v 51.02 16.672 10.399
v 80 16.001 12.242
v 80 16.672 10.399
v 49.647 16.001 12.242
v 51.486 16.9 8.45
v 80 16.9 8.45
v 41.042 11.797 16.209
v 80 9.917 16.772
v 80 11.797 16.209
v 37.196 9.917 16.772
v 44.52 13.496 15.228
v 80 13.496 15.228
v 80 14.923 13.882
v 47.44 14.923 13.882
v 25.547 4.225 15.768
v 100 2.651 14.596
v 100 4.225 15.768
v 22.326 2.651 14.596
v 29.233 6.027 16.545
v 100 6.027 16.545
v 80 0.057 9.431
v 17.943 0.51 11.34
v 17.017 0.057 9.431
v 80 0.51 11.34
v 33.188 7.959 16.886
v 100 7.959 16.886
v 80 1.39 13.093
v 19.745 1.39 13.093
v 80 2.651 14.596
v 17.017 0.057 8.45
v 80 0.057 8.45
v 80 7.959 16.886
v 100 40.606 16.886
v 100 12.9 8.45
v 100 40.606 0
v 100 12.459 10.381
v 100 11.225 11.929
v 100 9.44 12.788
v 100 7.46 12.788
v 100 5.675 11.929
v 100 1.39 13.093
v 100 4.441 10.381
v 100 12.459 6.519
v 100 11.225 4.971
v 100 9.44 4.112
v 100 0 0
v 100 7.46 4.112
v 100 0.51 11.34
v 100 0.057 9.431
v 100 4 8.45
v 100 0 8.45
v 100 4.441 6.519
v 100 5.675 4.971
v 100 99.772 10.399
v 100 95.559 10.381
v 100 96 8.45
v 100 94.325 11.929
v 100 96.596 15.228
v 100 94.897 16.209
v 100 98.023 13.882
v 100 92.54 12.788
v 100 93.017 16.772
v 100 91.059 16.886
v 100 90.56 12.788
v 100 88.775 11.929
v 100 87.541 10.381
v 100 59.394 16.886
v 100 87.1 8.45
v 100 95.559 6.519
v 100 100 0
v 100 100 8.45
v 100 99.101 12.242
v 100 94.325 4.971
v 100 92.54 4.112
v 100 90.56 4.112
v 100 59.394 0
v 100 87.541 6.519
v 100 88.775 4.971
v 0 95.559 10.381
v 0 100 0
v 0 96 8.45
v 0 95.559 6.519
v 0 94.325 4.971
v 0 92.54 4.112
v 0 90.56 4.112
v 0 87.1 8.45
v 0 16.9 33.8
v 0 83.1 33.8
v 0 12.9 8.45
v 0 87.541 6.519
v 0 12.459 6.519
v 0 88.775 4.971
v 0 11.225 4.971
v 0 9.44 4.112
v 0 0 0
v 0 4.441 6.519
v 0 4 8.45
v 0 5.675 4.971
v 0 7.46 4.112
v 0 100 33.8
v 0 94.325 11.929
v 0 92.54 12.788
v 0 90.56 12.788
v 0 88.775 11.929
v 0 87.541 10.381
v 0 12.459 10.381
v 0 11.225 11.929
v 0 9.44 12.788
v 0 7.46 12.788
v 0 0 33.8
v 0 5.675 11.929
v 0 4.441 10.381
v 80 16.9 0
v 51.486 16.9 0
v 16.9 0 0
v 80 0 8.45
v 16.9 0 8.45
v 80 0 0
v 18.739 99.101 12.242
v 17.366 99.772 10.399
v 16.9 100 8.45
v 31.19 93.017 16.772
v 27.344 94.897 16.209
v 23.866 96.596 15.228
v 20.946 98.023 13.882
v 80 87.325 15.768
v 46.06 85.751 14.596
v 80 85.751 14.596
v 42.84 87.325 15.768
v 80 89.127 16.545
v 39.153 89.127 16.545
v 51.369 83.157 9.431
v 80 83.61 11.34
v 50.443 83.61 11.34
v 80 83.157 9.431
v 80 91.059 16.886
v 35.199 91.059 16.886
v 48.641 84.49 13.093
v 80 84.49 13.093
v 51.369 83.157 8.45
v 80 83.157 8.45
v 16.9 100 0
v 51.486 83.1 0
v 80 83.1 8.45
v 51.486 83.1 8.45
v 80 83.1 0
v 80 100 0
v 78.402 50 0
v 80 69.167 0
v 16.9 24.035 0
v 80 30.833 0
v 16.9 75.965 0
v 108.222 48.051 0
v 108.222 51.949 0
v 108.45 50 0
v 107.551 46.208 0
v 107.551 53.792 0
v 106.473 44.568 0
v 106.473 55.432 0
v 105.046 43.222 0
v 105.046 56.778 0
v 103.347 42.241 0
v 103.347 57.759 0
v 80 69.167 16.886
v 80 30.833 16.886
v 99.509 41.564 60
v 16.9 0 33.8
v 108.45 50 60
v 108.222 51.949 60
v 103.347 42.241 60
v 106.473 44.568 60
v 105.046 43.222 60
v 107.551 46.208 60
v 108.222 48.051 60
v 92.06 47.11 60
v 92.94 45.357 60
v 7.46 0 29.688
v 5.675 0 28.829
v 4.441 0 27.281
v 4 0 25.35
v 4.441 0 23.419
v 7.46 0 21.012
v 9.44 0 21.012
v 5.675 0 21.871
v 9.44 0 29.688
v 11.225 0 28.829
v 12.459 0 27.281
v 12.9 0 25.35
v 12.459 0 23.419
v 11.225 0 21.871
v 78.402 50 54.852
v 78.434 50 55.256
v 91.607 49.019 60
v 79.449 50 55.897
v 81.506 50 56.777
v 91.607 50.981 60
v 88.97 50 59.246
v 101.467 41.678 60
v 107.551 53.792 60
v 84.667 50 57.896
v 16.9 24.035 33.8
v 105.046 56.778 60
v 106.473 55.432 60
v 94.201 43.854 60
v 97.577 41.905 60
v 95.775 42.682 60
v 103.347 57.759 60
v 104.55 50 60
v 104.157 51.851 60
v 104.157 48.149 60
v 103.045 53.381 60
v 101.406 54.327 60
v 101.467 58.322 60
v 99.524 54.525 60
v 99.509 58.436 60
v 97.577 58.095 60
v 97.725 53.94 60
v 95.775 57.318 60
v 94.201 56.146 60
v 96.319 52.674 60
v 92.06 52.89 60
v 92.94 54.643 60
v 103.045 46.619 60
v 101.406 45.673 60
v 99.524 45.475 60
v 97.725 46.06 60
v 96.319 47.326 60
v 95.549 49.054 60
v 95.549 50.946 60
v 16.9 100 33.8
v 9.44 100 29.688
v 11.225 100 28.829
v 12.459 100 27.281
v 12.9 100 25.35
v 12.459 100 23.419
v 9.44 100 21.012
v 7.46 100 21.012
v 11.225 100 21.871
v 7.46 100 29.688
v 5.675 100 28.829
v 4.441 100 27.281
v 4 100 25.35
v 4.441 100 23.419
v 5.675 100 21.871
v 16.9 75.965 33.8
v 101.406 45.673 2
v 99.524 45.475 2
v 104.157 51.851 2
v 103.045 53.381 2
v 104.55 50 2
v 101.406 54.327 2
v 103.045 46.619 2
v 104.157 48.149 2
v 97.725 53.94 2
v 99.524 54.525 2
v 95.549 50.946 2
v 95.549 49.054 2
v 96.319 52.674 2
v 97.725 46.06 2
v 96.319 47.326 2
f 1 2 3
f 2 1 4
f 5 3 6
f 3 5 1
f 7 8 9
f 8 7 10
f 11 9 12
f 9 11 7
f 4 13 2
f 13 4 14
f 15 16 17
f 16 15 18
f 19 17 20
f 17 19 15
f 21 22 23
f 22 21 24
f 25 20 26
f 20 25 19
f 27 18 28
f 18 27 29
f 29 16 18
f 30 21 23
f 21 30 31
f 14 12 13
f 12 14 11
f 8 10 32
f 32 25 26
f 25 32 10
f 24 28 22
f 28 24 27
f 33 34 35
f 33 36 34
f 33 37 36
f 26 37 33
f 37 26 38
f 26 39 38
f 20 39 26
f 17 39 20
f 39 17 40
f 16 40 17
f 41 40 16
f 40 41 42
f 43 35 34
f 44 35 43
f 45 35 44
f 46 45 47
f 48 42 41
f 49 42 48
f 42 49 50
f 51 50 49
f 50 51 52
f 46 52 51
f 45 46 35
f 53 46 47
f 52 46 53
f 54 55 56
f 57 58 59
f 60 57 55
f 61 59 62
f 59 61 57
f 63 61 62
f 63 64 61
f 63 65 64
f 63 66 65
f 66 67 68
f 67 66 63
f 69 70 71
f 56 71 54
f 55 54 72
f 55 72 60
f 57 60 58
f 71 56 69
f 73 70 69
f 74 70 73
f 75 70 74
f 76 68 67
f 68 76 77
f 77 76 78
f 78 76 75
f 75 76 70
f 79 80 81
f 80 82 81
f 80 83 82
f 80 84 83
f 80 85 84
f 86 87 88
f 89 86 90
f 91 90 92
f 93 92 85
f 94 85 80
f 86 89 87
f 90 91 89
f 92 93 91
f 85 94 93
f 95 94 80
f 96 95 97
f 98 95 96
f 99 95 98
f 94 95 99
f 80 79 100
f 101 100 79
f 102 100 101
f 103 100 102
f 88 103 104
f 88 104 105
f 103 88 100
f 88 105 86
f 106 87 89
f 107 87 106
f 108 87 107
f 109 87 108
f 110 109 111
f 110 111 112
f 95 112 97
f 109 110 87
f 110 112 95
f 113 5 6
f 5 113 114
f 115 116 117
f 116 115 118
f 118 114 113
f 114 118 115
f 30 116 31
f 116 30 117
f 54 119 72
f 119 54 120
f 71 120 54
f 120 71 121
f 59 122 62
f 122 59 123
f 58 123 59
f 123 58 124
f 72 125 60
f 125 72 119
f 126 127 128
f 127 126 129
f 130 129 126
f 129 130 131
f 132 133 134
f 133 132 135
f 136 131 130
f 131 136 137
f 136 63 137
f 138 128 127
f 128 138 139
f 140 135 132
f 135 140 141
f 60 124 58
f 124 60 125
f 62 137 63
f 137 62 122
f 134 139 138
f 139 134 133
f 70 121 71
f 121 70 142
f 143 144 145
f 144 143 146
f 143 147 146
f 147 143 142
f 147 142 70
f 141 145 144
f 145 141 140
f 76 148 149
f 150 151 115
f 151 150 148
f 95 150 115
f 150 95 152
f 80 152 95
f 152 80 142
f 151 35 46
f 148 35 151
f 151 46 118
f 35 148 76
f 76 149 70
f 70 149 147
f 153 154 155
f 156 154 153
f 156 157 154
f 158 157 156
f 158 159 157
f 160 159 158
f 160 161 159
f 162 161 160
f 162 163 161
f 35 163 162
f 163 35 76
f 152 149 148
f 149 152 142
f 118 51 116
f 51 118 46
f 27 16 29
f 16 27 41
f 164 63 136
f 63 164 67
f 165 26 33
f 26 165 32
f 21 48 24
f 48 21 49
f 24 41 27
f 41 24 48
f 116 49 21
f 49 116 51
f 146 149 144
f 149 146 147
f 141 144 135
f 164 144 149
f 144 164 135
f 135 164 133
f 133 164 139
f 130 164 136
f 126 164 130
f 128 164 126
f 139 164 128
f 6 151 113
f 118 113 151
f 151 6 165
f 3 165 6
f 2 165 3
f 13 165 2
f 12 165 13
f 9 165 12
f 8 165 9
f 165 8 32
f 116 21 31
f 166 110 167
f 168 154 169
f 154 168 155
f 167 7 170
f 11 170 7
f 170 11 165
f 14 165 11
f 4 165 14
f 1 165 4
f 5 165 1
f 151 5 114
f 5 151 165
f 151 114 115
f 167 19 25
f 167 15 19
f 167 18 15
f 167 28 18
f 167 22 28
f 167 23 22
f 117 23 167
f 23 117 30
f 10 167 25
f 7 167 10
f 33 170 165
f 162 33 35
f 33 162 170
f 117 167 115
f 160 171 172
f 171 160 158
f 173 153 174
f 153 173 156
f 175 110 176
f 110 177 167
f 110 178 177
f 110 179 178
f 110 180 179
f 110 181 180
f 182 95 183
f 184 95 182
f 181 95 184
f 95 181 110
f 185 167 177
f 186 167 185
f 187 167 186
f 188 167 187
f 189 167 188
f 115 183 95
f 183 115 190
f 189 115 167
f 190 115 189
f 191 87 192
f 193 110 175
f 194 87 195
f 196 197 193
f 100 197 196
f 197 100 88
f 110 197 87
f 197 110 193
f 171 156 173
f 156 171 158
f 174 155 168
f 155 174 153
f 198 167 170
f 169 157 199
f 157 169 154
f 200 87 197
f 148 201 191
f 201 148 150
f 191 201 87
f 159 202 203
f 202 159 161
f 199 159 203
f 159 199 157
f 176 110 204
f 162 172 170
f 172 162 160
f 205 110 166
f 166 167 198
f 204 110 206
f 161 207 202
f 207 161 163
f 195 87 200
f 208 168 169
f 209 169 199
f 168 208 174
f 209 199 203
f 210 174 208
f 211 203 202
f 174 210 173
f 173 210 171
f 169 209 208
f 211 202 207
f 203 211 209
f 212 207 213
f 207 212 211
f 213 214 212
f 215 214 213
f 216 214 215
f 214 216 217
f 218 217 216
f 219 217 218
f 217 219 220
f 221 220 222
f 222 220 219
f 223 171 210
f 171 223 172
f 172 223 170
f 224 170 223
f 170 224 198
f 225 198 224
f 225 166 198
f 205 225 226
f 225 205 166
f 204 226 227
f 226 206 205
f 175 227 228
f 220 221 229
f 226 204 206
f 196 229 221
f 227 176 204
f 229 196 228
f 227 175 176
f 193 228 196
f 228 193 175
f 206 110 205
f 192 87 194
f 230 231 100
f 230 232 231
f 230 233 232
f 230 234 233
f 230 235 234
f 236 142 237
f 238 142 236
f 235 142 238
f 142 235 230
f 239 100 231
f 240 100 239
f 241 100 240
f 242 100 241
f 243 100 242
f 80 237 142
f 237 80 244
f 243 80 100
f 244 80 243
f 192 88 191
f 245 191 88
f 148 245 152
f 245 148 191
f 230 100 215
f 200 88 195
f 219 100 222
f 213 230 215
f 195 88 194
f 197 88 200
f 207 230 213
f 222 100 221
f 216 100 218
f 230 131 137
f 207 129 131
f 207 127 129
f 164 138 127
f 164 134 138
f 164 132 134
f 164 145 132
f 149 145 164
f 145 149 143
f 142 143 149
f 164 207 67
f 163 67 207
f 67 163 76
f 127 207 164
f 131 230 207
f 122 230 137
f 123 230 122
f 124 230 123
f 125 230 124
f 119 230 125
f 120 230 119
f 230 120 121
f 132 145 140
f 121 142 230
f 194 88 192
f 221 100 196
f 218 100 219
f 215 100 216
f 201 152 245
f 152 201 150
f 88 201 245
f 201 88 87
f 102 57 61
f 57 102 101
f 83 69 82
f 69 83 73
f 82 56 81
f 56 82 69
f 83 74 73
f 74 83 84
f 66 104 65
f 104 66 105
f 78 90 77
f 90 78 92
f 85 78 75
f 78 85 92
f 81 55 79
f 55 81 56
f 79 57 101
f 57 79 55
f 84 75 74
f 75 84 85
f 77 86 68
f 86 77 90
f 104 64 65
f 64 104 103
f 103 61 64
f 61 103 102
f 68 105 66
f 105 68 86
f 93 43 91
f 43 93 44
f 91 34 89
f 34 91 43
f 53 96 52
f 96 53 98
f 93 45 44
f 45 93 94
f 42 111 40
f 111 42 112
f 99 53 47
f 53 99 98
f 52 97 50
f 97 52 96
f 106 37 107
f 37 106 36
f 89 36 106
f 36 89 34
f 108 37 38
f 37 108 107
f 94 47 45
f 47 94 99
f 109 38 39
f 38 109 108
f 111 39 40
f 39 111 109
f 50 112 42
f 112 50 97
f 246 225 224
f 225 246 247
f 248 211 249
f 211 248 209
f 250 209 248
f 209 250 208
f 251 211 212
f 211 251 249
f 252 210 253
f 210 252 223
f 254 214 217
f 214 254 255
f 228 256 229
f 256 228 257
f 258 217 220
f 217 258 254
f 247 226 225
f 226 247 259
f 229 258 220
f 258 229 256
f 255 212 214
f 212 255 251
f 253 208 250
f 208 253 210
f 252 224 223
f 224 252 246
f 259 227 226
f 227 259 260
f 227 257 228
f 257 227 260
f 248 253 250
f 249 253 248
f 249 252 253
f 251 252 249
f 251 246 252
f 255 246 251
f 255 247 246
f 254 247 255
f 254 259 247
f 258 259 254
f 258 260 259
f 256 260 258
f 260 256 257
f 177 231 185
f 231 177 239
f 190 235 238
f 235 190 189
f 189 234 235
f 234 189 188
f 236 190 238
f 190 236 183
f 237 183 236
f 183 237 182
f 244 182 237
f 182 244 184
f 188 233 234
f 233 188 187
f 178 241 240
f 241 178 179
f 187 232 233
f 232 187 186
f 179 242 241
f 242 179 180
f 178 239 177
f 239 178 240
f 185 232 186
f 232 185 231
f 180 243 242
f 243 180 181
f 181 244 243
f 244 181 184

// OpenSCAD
// ****************************************************************************
// Prusa Rigid Bottom Piece
//  By Blair Thompson
// www.justblair.co.uk
// ****************************************************************************

// Variables
// ****************************************************************************
threaded_rod_diameter = 8.9;
smooth_rod_diameter = 9.1;
bracket_thickness = 4;
vertex_rod_2_smooth_rod = 100;
base_width = 100;
base_height =60;

// Calculated Variabels
// ****************************************************************************
outer_diameter = threaded_rod_diameter + bracket_thickness*2; 

// Here Comes the Code!
// ****************************************************************************
difference(){
base();
rod_holes();
translate([vertex_rod_2_smooth_rod, base_width/2,2])
	cylinder(r=smooth_rod_diameter/2, h=base_height+2);
translate([outer_diameter/2,-1,outer_diameter*1.5])	
rotate([270,0,0])
cylinder(r=threaded_rod_diameter/2, h=base_width+2);
}// end difference
//ower_z_brace();
// Modules
// ****************************************************************************

module base(){
	hull (){
		translate([vertex_rod_2_smooth_rod, threaded_rod_diameter/2 + bracket_thickness, outer_diameter/2])
		rotate([270,0,90])
			lower_shape(20);
		// color([1,0,0])
		translate([vertex_rod_2_smooth_rod ,base_width - (threaded_rod_diameter/2 + bracket_thickness), outer_diameter/2])
		rotate([270,0,90])
			lower_shape(20);
	} // end hull
	
	translate([vertex_rod_2_smooth_rod,threaded_rod_diameter/2 + bracket_thickness, outer_diameter/2])
	rotate([270,0,90])
		lower_shape(vertex_rod_2_smooth_rod);
	// color([1,0,0])
	translate([vertex_rod_2_smooth_rod ,base_width - (threaded_rod_diameter/2 + bracket_thickness), outer_diameter/2])
	rotate([270,0,90])
		lower_shape(vertex_rod_2_smooth_rod);

	hull(){
		//translate([0, base_width/2-outer_diameter/2,])
		cube([outer_diameter, outer_diameter, outer_diameter*2]);
	translate([vertex_rod_2_smooth_rod, base_width/2,])
		cylinder(r=outer_diameter/2, h= base_height);
		} // end hull
	hull(){
		translate([0, base_width-outer_diameter,])
		cube([outer_diameter, outer_diameter, outer_diameter*2]);
	translate([vertex_rod_2_smooth_rod, base_width/2,])
		cylinder(r=outer_diameter/2, h= base_height);
		} // end hull
	cube([outer_diameter, base_width, outer_diameter*2]);
} //end module base

module lower_shape(cyl_length){
		cylinder(r=outer_diameter/2, h=cyl_length);
		translate([-outer_diameter/2, 0,0])
			cube ([outer_diameter, outer_diameter/2, cyl_length]);
} // end module

module rod_holes(){
		translate([vertex_rod_2_smooth_rod+1 ,base_width - (threaded_rod_diameter/2 + bracket_thickness), outer_diameter/2])
		rotate([270,0,90])
			cylinder(r=threaded_rod_diameter/2, h=vertex_rod_2_smooth_rod + 2);
		translate([vertex_rod_2_smooth_rod + 1,threaded_rod_diameter/2 + bracket_thickness, outer_diameter/2])
		rotate([270,0,90])
			cylinder(r=threaded_rod_diameter/2, h=vertex_rod_2_smooth_rod + 2);
} // end module
